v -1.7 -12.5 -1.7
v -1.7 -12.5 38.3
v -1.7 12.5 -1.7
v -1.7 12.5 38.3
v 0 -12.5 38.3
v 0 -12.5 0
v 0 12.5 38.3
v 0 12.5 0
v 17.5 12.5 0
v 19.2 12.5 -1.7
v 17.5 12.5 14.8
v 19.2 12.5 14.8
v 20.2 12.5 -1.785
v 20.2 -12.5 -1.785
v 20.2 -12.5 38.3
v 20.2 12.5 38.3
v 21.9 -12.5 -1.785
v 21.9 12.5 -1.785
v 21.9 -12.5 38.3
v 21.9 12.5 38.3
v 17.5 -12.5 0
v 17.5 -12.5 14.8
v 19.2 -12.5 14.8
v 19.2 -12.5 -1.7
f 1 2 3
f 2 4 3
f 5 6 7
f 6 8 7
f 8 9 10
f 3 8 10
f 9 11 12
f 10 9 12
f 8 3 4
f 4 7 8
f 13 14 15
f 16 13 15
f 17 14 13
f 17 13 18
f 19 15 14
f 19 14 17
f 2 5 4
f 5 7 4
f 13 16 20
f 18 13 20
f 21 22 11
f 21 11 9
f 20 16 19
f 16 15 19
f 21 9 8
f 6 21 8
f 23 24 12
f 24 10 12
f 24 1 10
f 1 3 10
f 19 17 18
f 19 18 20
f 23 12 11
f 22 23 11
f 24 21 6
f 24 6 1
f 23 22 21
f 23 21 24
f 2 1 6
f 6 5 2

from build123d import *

# Parameters (mm, degrees)
F0_W     = 1.7
F0_H     = 40.085336
F1_DEPTH = 12.5


with BuildPart() as f1:
    # F0 (on Front) → F1 (new body, symmetric)
    with BuildSketch(Plane.XZ):
        Polygon((17.5, 0), (0, 0), (0, 38.3), (-1.7, 38.3), (-1.7, -1.7), (19.2, -1.7), (19.2, 14.8), (17.5, 14.8), align=None)
        with Locations((21.05, 18.257332)):
            Rectangle(F0_W, F0_H)
    extrude(amount=F1_DEPTH, both=True)


solid = f1.part
